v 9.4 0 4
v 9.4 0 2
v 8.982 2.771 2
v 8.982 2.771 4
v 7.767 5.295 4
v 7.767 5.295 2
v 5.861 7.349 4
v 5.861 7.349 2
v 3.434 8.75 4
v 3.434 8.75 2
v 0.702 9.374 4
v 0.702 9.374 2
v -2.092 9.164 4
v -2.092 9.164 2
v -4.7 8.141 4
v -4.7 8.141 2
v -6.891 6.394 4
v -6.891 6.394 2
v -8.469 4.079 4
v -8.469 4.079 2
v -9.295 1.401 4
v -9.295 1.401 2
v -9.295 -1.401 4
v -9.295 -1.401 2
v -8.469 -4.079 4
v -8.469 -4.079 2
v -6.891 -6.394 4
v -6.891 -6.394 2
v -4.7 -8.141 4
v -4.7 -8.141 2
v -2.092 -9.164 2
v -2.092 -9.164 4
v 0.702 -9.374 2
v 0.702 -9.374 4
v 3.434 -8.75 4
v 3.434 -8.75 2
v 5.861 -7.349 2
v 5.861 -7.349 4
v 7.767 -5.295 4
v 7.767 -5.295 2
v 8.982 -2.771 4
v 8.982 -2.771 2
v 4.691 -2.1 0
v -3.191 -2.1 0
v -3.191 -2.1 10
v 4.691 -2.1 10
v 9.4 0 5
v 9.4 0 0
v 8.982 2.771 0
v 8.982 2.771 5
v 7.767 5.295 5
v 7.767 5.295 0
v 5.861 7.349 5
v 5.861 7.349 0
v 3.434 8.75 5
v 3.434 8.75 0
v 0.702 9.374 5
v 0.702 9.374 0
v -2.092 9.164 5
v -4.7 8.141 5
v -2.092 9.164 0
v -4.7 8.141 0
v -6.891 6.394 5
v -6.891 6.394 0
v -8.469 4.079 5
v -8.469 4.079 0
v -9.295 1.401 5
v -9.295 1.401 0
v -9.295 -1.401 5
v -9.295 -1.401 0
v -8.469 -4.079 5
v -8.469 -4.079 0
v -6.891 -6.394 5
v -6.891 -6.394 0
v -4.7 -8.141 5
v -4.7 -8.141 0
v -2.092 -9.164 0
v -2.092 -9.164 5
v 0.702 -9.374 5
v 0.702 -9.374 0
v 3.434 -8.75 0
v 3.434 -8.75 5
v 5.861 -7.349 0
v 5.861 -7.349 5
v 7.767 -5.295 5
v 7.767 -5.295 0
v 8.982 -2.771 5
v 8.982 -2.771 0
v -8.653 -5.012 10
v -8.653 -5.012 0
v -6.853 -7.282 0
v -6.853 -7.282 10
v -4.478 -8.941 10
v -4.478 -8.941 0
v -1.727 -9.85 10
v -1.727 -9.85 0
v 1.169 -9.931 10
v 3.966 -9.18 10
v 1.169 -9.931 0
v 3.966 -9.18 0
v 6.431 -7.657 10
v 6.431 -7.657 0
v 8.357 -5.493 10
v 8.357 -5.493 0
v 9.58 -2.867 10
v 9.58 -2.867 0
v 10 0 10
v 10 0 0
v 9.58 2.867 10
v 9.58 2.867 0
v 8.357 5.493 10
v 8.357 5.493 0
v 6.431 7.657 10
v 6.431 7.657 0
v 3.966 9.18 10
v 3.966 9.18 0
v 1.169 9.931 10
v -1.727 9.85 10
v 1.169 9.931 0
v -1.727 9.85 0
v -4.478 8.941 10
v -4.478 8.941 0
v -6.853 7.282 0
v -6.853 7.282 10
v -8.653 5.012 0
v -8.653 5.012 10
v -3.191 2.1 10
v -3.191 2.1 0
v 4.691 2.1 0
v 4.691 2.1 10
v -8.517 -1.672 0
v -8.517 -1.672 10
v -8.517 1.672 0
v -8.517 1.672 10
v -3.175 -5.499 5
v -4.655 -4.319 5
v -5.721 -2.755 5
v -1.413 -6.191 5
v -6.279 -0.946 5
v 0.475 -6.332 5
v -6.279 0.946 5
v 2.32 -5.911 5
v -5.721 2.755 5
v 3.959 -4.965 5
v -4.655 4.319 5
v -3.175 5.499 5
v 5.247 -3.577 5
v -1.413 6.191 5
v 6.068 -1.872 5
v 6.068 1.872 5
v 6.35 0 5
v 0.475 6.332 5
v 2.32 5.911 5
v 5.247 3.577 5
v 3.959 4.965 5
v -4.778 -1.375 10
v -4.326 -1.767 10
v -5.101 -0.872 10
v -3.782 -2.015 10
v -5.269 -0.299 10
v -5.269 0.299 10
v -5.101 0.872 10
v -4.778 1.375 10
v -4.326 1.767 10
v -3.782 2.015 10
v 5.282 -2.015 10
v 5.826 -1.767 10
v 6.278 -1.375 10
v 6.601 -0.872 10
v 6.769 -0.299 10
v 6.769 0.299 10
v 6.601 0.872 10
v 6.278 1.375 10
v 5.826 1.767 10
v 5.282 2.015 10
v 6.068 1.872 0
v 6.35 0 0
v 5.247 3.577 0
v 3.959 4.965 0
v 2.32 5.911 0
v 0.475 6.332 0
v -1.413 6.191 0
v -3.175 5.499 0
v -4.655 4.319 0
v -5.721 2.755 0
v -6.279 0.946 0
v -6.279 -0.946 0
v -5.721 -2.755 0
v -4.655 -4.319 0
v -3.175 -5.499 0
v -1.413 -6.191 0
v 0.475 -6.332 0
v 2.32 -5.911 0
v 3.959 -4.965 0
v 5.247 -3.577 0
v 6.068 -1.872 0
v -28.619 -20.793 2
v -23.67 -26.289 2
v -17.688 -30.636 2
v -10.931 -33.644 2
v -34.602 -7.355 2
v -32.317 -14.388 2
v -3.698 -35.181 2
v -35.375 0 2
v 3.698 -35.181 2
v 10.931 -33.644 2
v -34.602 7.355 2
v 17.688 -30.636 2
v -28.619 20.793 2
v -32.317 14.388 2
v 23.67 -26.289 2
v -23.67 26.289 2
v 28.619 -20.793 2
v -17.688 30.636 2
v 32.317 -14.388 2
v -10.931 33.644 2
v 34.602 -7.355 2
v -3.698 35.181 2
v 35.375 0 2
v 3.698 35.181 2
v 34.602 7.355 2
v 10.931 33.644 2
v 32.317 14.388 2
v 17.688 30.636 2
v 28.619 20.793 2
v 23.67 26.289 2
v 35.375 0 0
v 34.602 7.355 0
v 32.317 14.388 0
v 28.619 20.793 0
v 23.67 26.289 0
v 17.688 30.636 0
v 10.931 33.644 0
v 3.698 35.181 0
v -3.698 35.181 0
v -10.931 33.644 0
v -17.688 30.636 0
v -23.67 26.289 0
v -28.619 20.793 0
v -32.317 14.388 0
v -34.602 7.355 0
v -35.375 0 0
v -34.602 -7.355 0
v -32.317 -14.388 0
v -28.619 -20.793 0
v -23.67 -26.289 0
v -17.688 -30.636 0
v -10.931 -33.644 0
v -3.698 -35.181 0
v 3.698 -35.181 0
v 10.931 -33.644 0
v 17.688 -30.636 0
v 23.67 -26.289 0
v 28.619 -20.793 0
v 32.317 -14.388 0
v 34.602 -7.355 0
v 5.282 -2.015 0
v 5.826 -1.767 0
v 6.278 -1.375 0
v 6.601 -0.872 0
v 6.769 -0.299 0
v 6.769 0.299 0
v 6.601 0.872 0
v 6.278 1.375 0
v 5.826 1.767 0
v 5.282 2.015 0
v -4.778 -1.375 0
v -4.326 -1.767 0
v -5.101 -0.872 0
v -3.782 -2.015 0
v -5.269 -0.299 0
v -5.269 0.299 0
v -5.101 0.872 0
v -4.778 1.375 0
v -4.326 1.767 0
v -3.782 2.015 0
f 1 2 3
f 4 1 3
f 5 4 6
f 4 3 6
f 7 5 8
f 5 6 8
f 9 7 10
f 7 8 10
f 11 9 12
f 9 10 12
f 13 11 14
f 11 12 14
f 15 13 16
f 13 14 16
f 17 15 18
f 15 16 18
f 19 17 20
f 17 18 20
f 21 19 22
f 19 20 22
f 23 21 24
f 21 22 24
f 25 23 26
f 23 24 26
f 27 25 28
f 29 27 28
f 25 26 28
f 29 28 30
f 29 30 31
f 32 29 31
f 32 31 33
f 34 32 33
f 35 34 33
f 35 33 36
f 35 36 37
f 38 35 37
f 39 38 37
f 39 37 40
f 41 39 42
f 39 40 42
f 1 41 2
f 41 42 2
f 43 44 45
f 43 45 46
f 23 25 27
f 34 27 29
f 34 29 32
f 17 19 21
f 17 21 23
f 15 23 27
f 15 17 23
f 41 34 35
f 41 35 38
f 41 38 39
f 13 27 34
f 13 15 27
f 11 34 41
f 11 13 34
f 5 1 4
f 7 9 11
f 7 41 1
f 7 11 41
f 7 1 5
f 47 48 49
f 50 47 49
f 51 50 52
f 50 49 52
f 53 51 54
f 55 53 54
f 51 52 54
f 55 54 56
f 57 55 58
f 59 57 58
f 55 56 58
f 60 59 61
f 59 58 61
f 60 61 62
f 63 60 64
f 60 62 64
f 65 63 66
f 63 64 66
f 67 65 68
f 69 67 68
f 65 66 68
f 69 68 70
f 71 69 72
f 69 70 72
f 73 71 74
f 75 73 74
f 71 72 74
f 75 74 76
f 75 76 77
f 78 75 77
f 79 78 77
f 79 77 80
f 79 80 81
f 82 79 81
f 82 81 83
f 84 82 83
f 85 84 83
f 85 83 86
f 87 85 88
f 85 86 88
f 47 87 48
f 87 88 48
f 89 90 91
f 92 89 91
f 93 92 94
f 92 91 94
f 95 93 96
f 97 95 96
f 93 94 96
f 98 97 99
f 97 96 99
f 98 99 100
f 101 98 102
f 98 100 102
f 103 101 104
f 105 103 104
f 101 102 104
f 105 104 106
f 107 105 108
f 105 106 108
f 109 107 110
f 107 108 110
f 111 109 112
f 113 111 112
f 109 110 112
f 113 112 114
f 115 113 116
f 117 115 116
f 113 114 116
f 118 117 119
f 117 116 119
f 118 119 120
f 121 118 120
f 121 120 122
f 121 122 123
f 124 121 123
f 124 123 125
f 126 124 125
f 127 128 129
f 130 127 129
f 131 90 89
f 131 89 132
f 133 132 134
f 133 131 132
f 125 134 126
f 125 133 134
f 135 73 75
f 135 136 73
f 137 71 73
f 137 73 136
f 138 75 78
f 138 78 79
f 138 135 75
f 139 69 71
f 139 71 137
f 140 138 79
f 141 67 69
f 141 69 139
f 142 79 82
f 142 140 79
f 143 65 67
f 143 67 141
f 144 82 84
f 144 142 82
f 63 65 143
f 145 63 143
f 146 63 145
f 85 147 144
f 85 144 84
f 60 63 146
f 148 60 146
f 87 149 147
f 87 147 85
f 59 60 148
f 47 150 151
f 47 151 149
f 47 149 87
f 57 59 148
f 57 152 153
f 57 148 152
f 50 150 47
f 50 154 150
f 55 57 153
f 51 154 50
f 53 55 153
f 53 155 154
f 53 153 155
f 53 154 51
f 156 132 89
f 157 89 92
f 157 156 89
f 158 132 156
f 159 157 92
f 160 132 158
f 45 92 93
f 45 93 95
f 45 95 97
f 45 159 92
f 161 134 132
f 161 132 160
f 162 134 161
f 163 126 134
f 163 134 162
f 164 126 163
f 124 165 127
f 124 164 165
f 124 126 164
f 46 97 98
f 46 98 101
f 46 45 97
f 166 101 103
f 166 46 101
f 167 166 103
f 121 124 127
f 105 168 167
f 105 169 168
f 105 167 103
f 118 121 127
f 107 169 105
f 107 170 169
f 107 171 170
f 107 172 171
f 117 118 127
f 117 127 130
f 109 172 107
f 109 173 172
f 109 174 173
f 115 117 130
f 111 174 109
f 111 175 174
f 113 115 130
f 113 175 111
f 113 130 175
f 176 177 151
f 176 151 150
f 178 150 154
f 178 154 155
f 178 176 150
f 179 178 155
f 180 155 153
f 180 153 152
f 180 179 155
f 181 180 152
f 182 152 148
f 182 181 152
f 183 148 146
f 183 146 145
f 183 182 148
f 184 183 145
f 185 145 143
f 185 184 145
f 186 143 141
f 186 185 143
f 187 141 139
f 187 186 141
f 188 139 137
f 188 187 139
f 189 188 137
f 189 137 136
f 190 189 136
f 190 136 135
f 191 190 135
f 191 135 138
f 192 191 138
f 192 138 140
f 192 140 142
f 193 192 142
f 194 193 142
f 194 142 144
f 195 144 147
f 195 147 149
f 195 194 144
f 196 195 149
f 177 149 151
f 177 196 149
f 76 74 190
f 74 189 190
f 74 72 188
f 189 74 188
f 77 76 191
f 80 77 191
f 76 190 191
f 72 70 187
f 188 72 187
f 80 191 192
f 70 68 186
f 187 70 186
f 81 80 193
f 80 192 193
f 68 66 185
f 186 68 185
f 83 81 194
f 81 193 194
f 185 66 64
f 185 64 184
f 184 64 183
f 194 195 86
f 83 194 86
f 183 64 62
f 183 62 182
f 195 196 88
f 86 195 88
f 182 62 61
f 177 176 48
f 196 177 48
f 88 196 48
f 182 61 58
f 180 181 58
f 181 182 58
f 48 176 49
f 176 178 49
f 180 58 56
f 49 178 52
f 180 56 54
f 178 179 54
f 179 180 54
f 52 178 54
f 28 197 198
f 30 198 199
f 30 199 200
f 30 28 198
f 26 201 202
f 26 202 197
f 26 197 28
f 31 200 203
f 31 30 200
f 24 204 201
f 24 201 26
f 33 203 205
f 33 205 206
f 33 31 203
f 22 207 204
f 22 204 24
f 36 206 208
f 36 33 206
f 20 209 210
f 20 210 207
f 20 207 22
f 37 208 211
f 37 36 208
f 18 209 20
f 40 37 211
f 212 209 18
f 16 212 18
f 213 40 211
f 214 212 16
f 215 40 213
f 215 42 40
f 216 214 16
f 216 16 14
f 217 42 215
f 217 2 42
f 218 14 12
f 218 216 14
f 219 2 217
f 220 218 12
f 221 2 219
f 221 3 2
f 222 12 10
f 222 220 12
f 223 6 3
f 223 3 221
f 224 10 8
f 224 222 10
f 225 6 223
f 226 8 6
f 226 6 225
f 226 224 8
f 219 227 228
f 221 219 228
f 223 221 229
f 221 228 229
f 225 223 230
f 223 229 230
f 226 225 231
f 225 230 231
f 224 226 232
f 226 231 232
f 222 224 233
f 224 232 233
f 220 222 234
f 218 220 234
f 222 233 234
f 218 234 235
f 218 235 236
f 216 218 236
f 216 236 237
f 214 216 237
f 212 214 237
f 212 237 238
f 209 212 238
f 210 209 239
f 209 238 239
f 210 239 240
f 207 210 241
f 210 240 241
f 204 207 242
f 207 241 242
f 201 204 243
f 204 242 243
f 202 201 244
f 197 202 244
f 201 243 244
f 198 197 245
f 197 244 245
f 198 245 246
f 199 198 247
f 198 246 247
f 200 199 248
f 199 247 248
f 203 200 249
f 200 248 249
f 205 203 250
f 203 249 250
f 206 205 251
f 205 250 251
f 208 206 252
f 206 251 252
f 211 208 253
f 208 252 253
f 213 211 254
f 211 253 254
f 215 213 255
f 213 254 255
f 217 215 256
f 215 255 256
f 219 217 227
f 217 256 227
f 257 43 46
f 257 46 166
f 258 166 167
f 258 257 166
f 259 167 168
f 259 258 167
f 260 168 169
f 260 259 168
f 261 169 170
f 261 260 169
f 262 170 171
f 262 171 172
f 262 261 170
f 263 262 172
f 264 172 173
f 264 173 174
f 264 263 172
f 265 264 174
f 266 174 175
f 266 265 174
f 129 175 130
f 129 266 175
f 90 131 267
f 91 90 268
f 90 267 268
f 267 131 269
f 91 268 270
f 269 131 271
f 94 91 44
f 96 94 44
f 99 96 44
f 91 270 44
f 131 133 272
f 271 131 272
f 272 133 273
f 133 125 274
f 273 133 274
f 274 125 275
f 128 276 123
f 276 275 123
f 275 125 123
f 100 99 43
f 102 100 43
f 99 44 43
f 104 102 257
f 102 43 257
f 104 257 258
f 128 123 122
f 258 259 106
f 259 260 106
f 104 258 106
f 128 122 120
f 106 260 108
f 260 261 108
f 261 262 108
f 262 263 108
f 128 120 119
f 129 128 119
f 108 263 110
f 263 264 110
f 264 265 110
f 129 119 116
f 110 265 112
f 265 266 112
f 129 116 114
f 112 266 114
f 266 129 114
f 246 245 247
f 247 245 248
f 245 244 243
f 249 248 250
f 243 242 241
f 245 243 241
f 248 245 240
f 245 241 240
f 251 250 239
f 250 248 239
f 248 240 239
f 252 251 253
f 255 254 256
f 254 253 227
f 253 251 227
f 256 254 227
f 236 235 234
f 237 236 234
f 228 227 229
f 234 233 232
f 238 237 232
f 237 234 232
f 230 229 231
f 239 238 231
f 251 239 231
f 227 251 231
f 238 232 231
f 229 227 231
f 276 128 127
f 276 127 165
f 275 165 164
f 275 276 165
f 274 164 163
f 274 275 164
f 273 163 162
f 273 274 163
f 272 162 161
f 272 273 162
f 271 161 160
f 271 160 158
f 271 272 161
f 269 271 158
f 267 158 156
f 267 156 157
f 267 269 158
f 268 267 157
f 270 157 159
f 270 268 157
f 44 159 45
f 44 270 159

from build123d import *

# Parameters (mm, degrees)
SKETCH_R      = 35.375
PAD_DEPTH     = 2
SKETCH001_R   = 9.4
PAD001_DEPTH  = 2
PAD002_DEPTH  = 10
SKETCH003_R   = 9.4
SKETCH003_R_2 = 6.35
PAD003_DEPTH  = 5


with BuildPart() as body:
    # Sketch (on XY_Plane of Origin) → Pad (new body)
    with BuildSketch(Plane.XY):
        Circle(SKETCH_R)
    extrude(amount=PAD_DEPTH)

    # Sketch001 (on Face3 of Pad) → Pad001 (join)
    with BuildSketch(Plane.XY.offset(2)):
        Circle(SKETCH001_R)
    extrude(amount=PAD001_DEPTH)


with BuildPart() as edge_block:
    # Sketch002 (on XY_Plane001 of Origin002) → Pad002 (new body)
    with BuildSketch(Plane.XY):
        with BuildLine():
            ThreePointArc((-8.653315, -5.012), (10, 0), (-8.653315, 5.012))
            ThreePointArc((-8.653315, -5.012), (-8.5, 0), (-8.653315, 5.012))
        make_face()
        with BuildLine():
            ThreePointArc((-3.19054, 2.1), (-5.29054, 0), (-3.19054, -2.1))
            Line((-3.19054, -2.1), (4.69054, -2.1))
            ThreePointArc((4.69054, -2.1), (6.79054, 0), (4.69054, 2.1))
            Line((-3.19054, 2.1), (4.69054, 2.1))
        make_face(mode=Mode.SUBTRACT)
    extrude(amount=PAD002_DEPTH)


with BuildPart() as centering_washer:
    # Sketch003 (on XY_Plane002 of Origin004) → Pad003 (new body)
    with BuildSketch(Plane.XY):
        Circle(SKETCH003_R)
        Circle(SKETCH003_R_2, mode=Mode.SUBTRACT)
    extrude(amount=PAD003_DEPTH)


solid = Compound([body.part, edge_block.part, centering_washer.part])
